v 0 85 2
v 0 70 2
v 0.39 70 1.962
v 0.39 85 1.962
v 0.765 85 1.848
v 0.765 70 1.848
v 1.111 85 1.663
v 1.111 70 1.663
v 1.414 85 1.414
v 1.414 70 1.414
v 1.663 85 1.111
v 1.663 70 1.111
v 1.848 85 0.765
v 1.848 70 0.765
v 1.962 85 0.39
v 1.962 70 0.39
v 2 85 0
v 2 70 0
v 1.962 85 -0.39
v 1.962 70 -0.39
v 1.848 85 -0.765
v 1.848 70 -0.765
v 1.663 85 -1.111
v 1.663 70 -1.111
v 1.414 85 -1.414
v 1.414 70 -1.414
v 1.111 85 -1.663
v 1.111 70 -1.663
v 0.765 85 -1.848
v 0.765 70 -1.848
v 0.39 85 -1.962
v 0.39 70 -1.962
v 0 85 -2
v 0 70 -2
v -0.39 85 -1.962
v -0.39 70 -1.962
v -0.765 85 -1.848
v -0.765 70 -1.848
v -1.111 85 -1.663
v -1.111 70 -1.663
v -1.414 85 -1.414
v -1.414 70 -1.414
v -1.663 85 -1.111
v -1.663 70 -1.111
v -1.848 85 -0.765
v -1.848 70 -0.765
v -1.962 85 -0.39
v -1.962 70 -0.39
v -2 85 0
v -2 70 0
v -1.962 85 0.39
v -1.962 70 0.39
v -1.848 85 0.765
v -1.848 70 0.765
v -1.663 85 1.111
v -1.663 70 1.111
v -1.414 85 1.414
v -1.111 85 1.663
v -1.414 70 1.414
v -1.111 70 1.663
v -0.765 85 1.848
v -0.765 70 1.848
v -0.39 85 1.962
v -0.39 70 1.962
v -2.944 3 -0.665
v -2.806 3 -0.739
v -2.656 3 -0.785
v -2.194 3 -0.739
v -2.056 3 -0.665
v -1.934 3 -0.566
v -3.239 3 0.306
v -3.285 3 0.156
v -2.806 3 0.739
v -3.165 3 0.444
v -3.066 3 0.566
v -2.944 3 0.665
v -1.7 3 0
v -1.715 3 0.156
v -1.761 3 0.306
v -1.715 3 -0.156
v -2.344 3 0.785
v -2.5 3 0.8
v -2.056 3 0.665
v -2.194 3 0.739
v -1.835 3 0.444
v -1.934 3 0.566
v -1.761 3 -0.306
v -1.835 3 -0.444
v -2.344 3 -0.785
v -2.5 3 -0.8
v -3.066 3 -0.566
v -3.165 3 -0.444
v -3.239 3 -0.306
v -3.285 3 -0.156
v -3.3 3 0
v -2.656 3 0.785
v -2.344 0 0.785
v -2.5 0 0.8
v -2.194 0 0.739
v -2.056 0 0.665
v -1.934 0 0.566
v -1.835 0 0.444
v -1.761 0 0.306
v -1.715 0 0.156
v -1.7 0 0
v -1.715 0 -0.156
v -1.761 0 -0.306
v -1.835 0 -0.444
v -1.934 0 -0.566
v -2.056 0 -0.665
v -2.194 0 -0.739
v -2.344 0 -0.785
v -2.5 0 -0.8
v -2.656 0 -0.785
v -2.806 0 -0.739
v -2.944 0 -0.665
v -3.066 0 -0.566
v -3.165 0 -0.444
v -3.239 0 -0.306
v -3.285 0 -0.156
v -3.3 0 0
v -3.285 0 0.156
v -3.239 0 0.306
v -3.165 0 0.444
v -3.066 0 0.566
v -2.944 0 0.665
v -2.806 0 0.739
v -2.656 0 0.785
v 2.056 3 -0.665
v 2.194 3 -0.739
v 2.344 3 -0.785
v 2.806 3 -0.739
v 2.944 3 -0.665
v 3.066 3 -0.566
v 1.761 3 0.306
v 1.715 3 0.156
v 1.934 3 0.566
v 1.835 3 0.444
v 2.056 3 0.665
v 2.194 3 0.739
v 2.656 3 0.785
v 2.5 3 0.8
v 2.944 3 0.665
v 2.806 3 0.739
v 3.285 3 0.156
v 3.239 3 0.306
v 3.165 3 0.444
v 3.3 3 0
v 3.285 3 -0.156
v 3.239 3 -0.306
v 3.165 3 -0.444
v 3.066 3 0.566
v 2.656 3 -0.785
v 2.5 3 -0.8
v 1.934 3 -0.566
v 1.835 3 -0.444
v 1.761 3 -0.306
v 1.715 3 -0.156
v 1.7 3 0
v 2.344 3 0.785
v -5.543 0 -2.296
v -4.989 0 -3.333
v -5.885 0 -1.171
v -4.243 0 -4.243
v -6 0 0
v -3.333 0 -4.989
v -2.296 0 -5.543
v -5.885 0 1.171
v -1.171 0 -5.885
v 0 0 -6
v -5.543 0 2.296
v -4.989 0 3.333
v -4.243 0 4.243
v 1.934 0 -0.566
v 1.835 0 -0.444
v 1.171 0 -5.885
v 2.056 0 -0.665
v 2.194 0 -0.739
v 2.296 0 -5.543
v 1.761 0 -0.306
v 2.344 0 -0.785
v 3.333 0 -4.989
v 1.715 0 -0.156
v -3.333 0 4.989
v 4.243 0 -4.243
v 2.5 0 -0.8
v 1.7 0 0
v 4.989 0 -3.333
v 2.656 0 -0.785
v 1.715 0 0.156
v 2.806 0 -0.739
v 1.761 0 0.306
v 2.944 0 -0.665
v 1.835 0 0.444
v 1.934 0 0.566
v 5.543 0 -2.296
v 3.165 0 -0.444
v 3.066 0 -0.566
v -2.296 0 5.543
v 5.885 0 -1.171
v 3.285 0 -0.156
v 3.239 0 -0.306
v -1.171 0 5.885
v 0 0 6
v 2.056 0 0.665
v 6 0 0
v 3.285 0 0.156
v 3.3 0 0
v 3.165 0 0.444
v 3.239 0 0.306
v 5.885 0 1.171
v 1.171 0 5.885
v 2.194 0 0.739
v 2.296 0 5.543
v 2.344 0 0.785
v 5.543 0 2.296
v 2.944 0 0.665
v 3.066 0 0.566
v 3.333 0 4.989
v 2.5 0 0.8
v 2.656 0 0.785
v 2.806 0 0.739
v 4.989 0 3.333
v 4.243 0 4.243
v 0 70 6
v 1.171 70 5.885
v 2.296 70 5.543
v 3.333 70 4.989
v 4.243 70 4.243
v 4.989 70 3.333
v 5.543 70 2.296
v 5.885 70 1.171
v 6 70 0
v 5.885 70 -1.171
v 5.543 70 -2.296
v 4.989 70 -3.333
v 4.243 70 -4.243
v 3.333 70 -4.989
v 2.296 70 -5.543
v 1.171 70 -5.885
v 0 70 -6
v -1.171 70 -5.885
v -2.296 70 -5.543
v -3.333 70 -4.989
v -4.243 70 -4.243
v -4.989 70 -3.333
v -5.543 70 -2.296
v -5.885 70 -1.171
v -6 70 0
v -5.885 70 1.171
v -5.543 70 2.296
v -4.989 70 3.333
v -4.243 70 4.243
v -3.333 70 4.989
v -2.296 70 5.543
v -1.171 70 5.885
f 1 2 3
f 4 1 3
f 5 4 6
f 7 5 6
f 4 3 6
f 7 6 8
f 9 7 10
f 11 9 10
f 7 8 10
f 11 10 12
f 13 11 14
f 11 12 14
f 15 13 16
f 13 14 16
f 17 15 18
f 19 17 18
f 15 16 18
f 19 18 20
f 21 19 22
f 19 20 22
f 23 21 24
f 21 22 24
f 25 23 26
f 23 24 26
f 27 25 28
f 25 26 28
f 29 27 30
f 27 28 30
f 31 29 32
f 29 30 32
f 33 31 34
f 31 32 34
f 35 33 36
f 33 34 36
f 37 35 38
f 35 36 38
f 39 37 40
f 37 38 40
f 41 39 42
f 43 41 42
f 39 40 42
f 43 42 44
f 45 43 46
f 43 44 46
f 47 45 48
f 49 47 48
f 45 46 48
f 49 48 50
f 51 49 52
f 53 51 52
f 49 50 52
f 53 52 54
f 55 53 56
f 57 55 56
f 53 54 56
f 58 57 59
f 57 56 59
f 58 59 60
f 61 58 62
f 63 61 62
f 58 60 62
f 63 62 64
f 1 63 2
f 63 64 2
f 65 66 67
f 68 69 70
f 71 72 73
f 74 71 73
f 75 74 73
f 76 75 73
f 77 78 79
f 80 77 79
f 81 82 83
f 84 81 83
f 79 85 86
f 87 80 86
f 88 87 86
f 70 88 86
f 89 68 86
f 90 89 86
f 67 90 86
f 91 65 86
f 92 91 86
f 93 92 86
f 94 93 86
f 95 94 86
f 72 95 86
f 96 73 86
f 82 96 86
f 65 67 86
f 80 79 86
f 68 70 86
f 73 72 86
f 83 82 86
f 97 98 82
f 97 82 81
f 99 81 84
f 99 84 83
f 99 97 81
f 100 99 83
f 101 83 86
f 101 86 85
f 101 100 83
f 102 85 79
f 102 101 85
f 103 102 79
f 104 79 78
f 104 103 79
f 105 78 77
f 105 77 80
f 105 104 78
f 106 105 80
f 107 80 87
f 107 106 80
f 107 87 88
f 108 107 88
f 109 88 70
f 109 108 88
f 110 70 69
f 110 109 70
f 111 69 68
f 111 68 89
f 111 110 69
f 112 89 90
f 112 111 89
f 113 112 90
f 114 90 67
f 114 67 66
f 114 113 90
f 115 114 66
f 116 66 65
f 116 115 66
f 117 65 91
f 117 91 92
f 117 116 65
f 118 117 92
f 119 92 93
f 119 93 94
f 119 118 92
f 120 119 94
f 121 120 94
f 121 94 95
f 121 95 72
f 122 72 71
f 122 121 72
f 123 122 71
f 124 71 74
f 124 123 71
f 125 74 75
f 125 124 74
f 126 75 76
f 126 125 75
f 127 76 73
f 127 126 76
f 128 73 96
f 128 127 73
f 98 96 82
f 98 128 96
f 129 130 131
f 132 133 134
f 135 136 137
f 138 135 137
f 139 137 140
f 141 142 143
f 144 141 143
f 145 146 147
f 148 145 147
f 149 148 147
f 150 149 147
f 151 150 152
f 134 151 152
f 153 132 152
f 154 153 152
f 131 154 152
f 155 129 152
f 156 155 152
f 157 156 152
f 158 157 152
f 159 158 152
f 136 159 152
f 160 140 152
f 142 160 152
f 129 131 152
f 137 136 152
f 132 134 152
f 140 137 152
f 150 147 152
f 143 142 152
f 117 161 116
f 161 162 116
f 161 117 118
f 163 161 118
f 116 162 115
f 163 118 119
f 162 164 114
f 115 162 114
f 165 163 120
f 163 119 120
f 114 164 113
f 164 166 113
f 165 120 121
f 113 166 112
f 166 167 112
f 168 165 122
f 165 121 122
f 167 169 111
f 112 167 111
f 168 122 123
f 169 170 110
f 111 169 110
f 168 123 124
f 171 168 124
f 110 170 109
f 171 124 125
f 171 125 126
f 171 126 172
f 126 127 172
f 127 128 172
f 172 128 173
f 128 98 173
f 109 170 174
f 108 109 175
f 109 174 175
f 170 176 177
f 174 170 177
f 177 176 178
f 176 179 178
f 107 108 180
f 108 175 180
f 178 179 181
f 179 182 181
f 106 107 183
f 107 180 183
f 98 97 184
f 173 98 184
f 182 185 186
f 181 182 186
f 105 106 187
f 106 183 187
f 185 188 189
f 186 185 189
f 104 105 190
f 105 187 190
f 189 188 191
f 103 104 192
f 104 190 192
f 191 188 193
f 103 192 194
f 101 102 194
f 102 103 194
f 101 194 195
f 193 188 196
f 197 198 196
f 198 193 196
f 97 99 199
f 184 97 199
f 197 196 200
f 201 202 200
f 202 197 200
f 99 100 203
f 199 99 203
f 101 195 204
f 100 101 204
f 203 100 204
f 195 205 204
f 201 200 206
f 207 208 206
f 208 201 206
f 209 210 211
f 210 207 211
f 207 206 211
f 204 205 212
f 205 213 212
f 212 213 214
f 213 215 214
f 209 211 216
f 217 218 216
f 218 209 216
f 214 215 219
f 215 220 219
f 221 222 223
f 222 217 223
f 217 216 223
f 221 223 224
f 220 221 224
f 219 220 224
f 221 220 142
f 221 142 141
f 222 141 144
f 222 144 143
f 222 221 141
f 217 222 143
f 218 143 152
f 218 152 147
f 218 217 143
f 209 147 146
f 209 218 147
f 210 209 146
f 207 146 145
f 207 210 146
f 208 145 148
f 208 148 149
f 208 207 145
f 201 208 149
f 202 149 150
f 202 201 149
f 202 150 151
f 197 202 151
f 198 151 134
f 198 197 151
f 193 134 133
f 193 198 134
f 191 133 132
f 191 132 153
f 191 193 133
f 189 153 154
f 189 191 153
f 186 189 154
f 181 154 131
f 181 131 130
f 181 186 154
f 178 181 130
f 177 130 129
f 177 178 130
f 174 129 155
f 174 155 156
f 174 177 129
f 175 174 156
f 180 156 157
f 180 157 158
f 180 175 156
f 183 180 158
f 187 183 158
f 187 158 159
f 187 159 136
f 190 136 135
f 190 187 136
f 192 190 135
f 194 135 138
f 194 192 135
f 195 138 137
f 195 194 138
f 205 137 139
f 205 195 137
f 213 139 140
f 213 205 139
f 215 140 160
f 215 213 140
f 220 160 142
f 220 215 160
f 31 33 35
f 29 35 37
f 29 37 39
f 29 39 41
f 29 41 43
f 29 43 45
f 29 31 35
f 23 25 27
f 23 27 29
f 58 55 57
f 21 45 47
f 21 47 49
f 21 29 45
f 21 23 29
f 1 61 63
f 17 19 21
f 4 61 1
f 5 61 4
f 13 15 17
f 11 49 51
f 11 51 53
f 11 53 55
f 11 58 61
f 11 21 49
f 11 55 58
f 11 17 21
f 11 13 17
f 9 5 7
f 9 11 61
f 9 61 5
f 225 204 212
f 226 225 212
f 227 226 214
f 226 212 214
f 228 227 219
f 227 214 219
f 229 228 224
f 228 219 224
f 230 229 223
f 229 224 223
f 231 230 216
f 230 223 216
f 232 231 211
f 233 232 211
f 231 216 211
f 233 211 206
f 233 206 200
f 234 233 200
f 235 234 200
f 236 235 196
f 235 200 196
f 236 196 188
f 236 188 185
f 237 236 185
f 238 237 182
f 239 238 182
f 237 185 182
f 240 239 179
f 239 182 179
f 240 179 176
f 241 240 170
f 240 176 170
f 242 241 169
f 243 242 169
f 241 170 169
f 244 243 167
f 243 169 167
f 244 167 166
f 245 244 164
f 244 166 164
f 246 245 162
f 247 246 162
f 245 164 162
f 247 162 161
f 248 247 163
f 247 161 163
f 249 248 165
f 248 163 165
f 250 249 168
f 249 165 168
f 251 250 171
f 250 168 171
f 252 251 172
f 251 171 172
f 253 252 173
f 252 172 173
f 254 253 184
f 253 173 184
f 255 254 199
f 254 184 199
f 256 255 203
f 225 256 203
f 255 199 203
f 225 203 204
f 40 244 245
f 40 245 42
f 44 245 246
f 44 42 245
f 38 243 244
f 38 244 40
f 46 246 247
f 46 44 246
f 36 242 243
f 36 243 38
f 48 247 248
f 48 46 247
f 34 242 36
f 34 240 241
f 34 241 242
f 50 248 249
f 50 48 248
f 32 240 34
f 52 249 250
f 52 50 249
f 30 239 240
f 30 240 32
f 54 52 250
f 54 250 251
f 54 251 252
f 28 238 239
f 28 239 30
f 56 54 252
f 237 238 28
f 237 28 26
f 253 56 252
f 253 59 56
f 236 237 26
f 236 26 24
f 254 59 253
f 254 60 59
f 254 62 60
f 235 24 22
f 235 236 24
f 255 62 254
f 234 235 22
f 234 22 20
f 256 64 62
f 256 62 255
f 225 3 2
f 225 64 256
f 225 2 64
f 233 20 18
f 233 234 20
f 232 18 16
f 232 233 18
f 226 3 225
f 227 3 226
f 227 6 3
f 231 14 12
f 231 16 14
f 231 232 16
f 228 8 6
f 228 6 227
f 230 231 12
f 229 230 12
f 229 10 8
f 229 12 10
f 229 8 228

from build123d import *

# Parameters (mm, degrees)
SKETCH1_R        = 6
PROBE_BODY_DEPTH = 70
SKETCH2_R        = 0.8
PIN_WELLS_DEPTH  = 3
CABLE_STUB_START = 70
SKETCH3_R        = 2
CABLE_STUB_DEPTH = 15


with BuildPart() as part:
    # Sketch1 → Probe_Body (new body)
    with BuildSketch(Plane(origin=(0, 0, 0), x_dir=(1, 0, 0), z_dir=(0, 1, 0))):
        with Locations(Location((0, 0, 0), (0, 0, 270))):
            Circle(SKETCH1_R)
    extrude(amount=PROBE_BODY_DEPTH)

    # Sketch2 → Pin_Wells (cut)
    with BuildSketch(Plane(origin=(0, 0, 0), x_dir=(1, 0, 0), z_dir=(0, 1, 0))):
        with Locations(Location((-2.5, 0, 0), (0, 0, 270))):
            Circle(SKETCH2_R)
        with Locations(Location((2.5, 0, 0), (0, 0, 270))):
            Circle(SKETCH2_R)
    extrude(amount=PIN_WELLS_DEPTH, mode=Mode.SUBTRACT)

    # Sketch3 → Cable_Stub (add)
    with BuildSketch(Plane(origin=(0, 0, 0), x_dir=(1, 0, 0), z_dir=(0, 1, 0)).offset(CABLE_STUB_START)):
        with Locations(Location((0, 0, 0), (0, 0, 270))):
            Circle(SKETCH3_R)
    extrude(amount=CABLE_STUB_DEPTH)


solid = part.part
